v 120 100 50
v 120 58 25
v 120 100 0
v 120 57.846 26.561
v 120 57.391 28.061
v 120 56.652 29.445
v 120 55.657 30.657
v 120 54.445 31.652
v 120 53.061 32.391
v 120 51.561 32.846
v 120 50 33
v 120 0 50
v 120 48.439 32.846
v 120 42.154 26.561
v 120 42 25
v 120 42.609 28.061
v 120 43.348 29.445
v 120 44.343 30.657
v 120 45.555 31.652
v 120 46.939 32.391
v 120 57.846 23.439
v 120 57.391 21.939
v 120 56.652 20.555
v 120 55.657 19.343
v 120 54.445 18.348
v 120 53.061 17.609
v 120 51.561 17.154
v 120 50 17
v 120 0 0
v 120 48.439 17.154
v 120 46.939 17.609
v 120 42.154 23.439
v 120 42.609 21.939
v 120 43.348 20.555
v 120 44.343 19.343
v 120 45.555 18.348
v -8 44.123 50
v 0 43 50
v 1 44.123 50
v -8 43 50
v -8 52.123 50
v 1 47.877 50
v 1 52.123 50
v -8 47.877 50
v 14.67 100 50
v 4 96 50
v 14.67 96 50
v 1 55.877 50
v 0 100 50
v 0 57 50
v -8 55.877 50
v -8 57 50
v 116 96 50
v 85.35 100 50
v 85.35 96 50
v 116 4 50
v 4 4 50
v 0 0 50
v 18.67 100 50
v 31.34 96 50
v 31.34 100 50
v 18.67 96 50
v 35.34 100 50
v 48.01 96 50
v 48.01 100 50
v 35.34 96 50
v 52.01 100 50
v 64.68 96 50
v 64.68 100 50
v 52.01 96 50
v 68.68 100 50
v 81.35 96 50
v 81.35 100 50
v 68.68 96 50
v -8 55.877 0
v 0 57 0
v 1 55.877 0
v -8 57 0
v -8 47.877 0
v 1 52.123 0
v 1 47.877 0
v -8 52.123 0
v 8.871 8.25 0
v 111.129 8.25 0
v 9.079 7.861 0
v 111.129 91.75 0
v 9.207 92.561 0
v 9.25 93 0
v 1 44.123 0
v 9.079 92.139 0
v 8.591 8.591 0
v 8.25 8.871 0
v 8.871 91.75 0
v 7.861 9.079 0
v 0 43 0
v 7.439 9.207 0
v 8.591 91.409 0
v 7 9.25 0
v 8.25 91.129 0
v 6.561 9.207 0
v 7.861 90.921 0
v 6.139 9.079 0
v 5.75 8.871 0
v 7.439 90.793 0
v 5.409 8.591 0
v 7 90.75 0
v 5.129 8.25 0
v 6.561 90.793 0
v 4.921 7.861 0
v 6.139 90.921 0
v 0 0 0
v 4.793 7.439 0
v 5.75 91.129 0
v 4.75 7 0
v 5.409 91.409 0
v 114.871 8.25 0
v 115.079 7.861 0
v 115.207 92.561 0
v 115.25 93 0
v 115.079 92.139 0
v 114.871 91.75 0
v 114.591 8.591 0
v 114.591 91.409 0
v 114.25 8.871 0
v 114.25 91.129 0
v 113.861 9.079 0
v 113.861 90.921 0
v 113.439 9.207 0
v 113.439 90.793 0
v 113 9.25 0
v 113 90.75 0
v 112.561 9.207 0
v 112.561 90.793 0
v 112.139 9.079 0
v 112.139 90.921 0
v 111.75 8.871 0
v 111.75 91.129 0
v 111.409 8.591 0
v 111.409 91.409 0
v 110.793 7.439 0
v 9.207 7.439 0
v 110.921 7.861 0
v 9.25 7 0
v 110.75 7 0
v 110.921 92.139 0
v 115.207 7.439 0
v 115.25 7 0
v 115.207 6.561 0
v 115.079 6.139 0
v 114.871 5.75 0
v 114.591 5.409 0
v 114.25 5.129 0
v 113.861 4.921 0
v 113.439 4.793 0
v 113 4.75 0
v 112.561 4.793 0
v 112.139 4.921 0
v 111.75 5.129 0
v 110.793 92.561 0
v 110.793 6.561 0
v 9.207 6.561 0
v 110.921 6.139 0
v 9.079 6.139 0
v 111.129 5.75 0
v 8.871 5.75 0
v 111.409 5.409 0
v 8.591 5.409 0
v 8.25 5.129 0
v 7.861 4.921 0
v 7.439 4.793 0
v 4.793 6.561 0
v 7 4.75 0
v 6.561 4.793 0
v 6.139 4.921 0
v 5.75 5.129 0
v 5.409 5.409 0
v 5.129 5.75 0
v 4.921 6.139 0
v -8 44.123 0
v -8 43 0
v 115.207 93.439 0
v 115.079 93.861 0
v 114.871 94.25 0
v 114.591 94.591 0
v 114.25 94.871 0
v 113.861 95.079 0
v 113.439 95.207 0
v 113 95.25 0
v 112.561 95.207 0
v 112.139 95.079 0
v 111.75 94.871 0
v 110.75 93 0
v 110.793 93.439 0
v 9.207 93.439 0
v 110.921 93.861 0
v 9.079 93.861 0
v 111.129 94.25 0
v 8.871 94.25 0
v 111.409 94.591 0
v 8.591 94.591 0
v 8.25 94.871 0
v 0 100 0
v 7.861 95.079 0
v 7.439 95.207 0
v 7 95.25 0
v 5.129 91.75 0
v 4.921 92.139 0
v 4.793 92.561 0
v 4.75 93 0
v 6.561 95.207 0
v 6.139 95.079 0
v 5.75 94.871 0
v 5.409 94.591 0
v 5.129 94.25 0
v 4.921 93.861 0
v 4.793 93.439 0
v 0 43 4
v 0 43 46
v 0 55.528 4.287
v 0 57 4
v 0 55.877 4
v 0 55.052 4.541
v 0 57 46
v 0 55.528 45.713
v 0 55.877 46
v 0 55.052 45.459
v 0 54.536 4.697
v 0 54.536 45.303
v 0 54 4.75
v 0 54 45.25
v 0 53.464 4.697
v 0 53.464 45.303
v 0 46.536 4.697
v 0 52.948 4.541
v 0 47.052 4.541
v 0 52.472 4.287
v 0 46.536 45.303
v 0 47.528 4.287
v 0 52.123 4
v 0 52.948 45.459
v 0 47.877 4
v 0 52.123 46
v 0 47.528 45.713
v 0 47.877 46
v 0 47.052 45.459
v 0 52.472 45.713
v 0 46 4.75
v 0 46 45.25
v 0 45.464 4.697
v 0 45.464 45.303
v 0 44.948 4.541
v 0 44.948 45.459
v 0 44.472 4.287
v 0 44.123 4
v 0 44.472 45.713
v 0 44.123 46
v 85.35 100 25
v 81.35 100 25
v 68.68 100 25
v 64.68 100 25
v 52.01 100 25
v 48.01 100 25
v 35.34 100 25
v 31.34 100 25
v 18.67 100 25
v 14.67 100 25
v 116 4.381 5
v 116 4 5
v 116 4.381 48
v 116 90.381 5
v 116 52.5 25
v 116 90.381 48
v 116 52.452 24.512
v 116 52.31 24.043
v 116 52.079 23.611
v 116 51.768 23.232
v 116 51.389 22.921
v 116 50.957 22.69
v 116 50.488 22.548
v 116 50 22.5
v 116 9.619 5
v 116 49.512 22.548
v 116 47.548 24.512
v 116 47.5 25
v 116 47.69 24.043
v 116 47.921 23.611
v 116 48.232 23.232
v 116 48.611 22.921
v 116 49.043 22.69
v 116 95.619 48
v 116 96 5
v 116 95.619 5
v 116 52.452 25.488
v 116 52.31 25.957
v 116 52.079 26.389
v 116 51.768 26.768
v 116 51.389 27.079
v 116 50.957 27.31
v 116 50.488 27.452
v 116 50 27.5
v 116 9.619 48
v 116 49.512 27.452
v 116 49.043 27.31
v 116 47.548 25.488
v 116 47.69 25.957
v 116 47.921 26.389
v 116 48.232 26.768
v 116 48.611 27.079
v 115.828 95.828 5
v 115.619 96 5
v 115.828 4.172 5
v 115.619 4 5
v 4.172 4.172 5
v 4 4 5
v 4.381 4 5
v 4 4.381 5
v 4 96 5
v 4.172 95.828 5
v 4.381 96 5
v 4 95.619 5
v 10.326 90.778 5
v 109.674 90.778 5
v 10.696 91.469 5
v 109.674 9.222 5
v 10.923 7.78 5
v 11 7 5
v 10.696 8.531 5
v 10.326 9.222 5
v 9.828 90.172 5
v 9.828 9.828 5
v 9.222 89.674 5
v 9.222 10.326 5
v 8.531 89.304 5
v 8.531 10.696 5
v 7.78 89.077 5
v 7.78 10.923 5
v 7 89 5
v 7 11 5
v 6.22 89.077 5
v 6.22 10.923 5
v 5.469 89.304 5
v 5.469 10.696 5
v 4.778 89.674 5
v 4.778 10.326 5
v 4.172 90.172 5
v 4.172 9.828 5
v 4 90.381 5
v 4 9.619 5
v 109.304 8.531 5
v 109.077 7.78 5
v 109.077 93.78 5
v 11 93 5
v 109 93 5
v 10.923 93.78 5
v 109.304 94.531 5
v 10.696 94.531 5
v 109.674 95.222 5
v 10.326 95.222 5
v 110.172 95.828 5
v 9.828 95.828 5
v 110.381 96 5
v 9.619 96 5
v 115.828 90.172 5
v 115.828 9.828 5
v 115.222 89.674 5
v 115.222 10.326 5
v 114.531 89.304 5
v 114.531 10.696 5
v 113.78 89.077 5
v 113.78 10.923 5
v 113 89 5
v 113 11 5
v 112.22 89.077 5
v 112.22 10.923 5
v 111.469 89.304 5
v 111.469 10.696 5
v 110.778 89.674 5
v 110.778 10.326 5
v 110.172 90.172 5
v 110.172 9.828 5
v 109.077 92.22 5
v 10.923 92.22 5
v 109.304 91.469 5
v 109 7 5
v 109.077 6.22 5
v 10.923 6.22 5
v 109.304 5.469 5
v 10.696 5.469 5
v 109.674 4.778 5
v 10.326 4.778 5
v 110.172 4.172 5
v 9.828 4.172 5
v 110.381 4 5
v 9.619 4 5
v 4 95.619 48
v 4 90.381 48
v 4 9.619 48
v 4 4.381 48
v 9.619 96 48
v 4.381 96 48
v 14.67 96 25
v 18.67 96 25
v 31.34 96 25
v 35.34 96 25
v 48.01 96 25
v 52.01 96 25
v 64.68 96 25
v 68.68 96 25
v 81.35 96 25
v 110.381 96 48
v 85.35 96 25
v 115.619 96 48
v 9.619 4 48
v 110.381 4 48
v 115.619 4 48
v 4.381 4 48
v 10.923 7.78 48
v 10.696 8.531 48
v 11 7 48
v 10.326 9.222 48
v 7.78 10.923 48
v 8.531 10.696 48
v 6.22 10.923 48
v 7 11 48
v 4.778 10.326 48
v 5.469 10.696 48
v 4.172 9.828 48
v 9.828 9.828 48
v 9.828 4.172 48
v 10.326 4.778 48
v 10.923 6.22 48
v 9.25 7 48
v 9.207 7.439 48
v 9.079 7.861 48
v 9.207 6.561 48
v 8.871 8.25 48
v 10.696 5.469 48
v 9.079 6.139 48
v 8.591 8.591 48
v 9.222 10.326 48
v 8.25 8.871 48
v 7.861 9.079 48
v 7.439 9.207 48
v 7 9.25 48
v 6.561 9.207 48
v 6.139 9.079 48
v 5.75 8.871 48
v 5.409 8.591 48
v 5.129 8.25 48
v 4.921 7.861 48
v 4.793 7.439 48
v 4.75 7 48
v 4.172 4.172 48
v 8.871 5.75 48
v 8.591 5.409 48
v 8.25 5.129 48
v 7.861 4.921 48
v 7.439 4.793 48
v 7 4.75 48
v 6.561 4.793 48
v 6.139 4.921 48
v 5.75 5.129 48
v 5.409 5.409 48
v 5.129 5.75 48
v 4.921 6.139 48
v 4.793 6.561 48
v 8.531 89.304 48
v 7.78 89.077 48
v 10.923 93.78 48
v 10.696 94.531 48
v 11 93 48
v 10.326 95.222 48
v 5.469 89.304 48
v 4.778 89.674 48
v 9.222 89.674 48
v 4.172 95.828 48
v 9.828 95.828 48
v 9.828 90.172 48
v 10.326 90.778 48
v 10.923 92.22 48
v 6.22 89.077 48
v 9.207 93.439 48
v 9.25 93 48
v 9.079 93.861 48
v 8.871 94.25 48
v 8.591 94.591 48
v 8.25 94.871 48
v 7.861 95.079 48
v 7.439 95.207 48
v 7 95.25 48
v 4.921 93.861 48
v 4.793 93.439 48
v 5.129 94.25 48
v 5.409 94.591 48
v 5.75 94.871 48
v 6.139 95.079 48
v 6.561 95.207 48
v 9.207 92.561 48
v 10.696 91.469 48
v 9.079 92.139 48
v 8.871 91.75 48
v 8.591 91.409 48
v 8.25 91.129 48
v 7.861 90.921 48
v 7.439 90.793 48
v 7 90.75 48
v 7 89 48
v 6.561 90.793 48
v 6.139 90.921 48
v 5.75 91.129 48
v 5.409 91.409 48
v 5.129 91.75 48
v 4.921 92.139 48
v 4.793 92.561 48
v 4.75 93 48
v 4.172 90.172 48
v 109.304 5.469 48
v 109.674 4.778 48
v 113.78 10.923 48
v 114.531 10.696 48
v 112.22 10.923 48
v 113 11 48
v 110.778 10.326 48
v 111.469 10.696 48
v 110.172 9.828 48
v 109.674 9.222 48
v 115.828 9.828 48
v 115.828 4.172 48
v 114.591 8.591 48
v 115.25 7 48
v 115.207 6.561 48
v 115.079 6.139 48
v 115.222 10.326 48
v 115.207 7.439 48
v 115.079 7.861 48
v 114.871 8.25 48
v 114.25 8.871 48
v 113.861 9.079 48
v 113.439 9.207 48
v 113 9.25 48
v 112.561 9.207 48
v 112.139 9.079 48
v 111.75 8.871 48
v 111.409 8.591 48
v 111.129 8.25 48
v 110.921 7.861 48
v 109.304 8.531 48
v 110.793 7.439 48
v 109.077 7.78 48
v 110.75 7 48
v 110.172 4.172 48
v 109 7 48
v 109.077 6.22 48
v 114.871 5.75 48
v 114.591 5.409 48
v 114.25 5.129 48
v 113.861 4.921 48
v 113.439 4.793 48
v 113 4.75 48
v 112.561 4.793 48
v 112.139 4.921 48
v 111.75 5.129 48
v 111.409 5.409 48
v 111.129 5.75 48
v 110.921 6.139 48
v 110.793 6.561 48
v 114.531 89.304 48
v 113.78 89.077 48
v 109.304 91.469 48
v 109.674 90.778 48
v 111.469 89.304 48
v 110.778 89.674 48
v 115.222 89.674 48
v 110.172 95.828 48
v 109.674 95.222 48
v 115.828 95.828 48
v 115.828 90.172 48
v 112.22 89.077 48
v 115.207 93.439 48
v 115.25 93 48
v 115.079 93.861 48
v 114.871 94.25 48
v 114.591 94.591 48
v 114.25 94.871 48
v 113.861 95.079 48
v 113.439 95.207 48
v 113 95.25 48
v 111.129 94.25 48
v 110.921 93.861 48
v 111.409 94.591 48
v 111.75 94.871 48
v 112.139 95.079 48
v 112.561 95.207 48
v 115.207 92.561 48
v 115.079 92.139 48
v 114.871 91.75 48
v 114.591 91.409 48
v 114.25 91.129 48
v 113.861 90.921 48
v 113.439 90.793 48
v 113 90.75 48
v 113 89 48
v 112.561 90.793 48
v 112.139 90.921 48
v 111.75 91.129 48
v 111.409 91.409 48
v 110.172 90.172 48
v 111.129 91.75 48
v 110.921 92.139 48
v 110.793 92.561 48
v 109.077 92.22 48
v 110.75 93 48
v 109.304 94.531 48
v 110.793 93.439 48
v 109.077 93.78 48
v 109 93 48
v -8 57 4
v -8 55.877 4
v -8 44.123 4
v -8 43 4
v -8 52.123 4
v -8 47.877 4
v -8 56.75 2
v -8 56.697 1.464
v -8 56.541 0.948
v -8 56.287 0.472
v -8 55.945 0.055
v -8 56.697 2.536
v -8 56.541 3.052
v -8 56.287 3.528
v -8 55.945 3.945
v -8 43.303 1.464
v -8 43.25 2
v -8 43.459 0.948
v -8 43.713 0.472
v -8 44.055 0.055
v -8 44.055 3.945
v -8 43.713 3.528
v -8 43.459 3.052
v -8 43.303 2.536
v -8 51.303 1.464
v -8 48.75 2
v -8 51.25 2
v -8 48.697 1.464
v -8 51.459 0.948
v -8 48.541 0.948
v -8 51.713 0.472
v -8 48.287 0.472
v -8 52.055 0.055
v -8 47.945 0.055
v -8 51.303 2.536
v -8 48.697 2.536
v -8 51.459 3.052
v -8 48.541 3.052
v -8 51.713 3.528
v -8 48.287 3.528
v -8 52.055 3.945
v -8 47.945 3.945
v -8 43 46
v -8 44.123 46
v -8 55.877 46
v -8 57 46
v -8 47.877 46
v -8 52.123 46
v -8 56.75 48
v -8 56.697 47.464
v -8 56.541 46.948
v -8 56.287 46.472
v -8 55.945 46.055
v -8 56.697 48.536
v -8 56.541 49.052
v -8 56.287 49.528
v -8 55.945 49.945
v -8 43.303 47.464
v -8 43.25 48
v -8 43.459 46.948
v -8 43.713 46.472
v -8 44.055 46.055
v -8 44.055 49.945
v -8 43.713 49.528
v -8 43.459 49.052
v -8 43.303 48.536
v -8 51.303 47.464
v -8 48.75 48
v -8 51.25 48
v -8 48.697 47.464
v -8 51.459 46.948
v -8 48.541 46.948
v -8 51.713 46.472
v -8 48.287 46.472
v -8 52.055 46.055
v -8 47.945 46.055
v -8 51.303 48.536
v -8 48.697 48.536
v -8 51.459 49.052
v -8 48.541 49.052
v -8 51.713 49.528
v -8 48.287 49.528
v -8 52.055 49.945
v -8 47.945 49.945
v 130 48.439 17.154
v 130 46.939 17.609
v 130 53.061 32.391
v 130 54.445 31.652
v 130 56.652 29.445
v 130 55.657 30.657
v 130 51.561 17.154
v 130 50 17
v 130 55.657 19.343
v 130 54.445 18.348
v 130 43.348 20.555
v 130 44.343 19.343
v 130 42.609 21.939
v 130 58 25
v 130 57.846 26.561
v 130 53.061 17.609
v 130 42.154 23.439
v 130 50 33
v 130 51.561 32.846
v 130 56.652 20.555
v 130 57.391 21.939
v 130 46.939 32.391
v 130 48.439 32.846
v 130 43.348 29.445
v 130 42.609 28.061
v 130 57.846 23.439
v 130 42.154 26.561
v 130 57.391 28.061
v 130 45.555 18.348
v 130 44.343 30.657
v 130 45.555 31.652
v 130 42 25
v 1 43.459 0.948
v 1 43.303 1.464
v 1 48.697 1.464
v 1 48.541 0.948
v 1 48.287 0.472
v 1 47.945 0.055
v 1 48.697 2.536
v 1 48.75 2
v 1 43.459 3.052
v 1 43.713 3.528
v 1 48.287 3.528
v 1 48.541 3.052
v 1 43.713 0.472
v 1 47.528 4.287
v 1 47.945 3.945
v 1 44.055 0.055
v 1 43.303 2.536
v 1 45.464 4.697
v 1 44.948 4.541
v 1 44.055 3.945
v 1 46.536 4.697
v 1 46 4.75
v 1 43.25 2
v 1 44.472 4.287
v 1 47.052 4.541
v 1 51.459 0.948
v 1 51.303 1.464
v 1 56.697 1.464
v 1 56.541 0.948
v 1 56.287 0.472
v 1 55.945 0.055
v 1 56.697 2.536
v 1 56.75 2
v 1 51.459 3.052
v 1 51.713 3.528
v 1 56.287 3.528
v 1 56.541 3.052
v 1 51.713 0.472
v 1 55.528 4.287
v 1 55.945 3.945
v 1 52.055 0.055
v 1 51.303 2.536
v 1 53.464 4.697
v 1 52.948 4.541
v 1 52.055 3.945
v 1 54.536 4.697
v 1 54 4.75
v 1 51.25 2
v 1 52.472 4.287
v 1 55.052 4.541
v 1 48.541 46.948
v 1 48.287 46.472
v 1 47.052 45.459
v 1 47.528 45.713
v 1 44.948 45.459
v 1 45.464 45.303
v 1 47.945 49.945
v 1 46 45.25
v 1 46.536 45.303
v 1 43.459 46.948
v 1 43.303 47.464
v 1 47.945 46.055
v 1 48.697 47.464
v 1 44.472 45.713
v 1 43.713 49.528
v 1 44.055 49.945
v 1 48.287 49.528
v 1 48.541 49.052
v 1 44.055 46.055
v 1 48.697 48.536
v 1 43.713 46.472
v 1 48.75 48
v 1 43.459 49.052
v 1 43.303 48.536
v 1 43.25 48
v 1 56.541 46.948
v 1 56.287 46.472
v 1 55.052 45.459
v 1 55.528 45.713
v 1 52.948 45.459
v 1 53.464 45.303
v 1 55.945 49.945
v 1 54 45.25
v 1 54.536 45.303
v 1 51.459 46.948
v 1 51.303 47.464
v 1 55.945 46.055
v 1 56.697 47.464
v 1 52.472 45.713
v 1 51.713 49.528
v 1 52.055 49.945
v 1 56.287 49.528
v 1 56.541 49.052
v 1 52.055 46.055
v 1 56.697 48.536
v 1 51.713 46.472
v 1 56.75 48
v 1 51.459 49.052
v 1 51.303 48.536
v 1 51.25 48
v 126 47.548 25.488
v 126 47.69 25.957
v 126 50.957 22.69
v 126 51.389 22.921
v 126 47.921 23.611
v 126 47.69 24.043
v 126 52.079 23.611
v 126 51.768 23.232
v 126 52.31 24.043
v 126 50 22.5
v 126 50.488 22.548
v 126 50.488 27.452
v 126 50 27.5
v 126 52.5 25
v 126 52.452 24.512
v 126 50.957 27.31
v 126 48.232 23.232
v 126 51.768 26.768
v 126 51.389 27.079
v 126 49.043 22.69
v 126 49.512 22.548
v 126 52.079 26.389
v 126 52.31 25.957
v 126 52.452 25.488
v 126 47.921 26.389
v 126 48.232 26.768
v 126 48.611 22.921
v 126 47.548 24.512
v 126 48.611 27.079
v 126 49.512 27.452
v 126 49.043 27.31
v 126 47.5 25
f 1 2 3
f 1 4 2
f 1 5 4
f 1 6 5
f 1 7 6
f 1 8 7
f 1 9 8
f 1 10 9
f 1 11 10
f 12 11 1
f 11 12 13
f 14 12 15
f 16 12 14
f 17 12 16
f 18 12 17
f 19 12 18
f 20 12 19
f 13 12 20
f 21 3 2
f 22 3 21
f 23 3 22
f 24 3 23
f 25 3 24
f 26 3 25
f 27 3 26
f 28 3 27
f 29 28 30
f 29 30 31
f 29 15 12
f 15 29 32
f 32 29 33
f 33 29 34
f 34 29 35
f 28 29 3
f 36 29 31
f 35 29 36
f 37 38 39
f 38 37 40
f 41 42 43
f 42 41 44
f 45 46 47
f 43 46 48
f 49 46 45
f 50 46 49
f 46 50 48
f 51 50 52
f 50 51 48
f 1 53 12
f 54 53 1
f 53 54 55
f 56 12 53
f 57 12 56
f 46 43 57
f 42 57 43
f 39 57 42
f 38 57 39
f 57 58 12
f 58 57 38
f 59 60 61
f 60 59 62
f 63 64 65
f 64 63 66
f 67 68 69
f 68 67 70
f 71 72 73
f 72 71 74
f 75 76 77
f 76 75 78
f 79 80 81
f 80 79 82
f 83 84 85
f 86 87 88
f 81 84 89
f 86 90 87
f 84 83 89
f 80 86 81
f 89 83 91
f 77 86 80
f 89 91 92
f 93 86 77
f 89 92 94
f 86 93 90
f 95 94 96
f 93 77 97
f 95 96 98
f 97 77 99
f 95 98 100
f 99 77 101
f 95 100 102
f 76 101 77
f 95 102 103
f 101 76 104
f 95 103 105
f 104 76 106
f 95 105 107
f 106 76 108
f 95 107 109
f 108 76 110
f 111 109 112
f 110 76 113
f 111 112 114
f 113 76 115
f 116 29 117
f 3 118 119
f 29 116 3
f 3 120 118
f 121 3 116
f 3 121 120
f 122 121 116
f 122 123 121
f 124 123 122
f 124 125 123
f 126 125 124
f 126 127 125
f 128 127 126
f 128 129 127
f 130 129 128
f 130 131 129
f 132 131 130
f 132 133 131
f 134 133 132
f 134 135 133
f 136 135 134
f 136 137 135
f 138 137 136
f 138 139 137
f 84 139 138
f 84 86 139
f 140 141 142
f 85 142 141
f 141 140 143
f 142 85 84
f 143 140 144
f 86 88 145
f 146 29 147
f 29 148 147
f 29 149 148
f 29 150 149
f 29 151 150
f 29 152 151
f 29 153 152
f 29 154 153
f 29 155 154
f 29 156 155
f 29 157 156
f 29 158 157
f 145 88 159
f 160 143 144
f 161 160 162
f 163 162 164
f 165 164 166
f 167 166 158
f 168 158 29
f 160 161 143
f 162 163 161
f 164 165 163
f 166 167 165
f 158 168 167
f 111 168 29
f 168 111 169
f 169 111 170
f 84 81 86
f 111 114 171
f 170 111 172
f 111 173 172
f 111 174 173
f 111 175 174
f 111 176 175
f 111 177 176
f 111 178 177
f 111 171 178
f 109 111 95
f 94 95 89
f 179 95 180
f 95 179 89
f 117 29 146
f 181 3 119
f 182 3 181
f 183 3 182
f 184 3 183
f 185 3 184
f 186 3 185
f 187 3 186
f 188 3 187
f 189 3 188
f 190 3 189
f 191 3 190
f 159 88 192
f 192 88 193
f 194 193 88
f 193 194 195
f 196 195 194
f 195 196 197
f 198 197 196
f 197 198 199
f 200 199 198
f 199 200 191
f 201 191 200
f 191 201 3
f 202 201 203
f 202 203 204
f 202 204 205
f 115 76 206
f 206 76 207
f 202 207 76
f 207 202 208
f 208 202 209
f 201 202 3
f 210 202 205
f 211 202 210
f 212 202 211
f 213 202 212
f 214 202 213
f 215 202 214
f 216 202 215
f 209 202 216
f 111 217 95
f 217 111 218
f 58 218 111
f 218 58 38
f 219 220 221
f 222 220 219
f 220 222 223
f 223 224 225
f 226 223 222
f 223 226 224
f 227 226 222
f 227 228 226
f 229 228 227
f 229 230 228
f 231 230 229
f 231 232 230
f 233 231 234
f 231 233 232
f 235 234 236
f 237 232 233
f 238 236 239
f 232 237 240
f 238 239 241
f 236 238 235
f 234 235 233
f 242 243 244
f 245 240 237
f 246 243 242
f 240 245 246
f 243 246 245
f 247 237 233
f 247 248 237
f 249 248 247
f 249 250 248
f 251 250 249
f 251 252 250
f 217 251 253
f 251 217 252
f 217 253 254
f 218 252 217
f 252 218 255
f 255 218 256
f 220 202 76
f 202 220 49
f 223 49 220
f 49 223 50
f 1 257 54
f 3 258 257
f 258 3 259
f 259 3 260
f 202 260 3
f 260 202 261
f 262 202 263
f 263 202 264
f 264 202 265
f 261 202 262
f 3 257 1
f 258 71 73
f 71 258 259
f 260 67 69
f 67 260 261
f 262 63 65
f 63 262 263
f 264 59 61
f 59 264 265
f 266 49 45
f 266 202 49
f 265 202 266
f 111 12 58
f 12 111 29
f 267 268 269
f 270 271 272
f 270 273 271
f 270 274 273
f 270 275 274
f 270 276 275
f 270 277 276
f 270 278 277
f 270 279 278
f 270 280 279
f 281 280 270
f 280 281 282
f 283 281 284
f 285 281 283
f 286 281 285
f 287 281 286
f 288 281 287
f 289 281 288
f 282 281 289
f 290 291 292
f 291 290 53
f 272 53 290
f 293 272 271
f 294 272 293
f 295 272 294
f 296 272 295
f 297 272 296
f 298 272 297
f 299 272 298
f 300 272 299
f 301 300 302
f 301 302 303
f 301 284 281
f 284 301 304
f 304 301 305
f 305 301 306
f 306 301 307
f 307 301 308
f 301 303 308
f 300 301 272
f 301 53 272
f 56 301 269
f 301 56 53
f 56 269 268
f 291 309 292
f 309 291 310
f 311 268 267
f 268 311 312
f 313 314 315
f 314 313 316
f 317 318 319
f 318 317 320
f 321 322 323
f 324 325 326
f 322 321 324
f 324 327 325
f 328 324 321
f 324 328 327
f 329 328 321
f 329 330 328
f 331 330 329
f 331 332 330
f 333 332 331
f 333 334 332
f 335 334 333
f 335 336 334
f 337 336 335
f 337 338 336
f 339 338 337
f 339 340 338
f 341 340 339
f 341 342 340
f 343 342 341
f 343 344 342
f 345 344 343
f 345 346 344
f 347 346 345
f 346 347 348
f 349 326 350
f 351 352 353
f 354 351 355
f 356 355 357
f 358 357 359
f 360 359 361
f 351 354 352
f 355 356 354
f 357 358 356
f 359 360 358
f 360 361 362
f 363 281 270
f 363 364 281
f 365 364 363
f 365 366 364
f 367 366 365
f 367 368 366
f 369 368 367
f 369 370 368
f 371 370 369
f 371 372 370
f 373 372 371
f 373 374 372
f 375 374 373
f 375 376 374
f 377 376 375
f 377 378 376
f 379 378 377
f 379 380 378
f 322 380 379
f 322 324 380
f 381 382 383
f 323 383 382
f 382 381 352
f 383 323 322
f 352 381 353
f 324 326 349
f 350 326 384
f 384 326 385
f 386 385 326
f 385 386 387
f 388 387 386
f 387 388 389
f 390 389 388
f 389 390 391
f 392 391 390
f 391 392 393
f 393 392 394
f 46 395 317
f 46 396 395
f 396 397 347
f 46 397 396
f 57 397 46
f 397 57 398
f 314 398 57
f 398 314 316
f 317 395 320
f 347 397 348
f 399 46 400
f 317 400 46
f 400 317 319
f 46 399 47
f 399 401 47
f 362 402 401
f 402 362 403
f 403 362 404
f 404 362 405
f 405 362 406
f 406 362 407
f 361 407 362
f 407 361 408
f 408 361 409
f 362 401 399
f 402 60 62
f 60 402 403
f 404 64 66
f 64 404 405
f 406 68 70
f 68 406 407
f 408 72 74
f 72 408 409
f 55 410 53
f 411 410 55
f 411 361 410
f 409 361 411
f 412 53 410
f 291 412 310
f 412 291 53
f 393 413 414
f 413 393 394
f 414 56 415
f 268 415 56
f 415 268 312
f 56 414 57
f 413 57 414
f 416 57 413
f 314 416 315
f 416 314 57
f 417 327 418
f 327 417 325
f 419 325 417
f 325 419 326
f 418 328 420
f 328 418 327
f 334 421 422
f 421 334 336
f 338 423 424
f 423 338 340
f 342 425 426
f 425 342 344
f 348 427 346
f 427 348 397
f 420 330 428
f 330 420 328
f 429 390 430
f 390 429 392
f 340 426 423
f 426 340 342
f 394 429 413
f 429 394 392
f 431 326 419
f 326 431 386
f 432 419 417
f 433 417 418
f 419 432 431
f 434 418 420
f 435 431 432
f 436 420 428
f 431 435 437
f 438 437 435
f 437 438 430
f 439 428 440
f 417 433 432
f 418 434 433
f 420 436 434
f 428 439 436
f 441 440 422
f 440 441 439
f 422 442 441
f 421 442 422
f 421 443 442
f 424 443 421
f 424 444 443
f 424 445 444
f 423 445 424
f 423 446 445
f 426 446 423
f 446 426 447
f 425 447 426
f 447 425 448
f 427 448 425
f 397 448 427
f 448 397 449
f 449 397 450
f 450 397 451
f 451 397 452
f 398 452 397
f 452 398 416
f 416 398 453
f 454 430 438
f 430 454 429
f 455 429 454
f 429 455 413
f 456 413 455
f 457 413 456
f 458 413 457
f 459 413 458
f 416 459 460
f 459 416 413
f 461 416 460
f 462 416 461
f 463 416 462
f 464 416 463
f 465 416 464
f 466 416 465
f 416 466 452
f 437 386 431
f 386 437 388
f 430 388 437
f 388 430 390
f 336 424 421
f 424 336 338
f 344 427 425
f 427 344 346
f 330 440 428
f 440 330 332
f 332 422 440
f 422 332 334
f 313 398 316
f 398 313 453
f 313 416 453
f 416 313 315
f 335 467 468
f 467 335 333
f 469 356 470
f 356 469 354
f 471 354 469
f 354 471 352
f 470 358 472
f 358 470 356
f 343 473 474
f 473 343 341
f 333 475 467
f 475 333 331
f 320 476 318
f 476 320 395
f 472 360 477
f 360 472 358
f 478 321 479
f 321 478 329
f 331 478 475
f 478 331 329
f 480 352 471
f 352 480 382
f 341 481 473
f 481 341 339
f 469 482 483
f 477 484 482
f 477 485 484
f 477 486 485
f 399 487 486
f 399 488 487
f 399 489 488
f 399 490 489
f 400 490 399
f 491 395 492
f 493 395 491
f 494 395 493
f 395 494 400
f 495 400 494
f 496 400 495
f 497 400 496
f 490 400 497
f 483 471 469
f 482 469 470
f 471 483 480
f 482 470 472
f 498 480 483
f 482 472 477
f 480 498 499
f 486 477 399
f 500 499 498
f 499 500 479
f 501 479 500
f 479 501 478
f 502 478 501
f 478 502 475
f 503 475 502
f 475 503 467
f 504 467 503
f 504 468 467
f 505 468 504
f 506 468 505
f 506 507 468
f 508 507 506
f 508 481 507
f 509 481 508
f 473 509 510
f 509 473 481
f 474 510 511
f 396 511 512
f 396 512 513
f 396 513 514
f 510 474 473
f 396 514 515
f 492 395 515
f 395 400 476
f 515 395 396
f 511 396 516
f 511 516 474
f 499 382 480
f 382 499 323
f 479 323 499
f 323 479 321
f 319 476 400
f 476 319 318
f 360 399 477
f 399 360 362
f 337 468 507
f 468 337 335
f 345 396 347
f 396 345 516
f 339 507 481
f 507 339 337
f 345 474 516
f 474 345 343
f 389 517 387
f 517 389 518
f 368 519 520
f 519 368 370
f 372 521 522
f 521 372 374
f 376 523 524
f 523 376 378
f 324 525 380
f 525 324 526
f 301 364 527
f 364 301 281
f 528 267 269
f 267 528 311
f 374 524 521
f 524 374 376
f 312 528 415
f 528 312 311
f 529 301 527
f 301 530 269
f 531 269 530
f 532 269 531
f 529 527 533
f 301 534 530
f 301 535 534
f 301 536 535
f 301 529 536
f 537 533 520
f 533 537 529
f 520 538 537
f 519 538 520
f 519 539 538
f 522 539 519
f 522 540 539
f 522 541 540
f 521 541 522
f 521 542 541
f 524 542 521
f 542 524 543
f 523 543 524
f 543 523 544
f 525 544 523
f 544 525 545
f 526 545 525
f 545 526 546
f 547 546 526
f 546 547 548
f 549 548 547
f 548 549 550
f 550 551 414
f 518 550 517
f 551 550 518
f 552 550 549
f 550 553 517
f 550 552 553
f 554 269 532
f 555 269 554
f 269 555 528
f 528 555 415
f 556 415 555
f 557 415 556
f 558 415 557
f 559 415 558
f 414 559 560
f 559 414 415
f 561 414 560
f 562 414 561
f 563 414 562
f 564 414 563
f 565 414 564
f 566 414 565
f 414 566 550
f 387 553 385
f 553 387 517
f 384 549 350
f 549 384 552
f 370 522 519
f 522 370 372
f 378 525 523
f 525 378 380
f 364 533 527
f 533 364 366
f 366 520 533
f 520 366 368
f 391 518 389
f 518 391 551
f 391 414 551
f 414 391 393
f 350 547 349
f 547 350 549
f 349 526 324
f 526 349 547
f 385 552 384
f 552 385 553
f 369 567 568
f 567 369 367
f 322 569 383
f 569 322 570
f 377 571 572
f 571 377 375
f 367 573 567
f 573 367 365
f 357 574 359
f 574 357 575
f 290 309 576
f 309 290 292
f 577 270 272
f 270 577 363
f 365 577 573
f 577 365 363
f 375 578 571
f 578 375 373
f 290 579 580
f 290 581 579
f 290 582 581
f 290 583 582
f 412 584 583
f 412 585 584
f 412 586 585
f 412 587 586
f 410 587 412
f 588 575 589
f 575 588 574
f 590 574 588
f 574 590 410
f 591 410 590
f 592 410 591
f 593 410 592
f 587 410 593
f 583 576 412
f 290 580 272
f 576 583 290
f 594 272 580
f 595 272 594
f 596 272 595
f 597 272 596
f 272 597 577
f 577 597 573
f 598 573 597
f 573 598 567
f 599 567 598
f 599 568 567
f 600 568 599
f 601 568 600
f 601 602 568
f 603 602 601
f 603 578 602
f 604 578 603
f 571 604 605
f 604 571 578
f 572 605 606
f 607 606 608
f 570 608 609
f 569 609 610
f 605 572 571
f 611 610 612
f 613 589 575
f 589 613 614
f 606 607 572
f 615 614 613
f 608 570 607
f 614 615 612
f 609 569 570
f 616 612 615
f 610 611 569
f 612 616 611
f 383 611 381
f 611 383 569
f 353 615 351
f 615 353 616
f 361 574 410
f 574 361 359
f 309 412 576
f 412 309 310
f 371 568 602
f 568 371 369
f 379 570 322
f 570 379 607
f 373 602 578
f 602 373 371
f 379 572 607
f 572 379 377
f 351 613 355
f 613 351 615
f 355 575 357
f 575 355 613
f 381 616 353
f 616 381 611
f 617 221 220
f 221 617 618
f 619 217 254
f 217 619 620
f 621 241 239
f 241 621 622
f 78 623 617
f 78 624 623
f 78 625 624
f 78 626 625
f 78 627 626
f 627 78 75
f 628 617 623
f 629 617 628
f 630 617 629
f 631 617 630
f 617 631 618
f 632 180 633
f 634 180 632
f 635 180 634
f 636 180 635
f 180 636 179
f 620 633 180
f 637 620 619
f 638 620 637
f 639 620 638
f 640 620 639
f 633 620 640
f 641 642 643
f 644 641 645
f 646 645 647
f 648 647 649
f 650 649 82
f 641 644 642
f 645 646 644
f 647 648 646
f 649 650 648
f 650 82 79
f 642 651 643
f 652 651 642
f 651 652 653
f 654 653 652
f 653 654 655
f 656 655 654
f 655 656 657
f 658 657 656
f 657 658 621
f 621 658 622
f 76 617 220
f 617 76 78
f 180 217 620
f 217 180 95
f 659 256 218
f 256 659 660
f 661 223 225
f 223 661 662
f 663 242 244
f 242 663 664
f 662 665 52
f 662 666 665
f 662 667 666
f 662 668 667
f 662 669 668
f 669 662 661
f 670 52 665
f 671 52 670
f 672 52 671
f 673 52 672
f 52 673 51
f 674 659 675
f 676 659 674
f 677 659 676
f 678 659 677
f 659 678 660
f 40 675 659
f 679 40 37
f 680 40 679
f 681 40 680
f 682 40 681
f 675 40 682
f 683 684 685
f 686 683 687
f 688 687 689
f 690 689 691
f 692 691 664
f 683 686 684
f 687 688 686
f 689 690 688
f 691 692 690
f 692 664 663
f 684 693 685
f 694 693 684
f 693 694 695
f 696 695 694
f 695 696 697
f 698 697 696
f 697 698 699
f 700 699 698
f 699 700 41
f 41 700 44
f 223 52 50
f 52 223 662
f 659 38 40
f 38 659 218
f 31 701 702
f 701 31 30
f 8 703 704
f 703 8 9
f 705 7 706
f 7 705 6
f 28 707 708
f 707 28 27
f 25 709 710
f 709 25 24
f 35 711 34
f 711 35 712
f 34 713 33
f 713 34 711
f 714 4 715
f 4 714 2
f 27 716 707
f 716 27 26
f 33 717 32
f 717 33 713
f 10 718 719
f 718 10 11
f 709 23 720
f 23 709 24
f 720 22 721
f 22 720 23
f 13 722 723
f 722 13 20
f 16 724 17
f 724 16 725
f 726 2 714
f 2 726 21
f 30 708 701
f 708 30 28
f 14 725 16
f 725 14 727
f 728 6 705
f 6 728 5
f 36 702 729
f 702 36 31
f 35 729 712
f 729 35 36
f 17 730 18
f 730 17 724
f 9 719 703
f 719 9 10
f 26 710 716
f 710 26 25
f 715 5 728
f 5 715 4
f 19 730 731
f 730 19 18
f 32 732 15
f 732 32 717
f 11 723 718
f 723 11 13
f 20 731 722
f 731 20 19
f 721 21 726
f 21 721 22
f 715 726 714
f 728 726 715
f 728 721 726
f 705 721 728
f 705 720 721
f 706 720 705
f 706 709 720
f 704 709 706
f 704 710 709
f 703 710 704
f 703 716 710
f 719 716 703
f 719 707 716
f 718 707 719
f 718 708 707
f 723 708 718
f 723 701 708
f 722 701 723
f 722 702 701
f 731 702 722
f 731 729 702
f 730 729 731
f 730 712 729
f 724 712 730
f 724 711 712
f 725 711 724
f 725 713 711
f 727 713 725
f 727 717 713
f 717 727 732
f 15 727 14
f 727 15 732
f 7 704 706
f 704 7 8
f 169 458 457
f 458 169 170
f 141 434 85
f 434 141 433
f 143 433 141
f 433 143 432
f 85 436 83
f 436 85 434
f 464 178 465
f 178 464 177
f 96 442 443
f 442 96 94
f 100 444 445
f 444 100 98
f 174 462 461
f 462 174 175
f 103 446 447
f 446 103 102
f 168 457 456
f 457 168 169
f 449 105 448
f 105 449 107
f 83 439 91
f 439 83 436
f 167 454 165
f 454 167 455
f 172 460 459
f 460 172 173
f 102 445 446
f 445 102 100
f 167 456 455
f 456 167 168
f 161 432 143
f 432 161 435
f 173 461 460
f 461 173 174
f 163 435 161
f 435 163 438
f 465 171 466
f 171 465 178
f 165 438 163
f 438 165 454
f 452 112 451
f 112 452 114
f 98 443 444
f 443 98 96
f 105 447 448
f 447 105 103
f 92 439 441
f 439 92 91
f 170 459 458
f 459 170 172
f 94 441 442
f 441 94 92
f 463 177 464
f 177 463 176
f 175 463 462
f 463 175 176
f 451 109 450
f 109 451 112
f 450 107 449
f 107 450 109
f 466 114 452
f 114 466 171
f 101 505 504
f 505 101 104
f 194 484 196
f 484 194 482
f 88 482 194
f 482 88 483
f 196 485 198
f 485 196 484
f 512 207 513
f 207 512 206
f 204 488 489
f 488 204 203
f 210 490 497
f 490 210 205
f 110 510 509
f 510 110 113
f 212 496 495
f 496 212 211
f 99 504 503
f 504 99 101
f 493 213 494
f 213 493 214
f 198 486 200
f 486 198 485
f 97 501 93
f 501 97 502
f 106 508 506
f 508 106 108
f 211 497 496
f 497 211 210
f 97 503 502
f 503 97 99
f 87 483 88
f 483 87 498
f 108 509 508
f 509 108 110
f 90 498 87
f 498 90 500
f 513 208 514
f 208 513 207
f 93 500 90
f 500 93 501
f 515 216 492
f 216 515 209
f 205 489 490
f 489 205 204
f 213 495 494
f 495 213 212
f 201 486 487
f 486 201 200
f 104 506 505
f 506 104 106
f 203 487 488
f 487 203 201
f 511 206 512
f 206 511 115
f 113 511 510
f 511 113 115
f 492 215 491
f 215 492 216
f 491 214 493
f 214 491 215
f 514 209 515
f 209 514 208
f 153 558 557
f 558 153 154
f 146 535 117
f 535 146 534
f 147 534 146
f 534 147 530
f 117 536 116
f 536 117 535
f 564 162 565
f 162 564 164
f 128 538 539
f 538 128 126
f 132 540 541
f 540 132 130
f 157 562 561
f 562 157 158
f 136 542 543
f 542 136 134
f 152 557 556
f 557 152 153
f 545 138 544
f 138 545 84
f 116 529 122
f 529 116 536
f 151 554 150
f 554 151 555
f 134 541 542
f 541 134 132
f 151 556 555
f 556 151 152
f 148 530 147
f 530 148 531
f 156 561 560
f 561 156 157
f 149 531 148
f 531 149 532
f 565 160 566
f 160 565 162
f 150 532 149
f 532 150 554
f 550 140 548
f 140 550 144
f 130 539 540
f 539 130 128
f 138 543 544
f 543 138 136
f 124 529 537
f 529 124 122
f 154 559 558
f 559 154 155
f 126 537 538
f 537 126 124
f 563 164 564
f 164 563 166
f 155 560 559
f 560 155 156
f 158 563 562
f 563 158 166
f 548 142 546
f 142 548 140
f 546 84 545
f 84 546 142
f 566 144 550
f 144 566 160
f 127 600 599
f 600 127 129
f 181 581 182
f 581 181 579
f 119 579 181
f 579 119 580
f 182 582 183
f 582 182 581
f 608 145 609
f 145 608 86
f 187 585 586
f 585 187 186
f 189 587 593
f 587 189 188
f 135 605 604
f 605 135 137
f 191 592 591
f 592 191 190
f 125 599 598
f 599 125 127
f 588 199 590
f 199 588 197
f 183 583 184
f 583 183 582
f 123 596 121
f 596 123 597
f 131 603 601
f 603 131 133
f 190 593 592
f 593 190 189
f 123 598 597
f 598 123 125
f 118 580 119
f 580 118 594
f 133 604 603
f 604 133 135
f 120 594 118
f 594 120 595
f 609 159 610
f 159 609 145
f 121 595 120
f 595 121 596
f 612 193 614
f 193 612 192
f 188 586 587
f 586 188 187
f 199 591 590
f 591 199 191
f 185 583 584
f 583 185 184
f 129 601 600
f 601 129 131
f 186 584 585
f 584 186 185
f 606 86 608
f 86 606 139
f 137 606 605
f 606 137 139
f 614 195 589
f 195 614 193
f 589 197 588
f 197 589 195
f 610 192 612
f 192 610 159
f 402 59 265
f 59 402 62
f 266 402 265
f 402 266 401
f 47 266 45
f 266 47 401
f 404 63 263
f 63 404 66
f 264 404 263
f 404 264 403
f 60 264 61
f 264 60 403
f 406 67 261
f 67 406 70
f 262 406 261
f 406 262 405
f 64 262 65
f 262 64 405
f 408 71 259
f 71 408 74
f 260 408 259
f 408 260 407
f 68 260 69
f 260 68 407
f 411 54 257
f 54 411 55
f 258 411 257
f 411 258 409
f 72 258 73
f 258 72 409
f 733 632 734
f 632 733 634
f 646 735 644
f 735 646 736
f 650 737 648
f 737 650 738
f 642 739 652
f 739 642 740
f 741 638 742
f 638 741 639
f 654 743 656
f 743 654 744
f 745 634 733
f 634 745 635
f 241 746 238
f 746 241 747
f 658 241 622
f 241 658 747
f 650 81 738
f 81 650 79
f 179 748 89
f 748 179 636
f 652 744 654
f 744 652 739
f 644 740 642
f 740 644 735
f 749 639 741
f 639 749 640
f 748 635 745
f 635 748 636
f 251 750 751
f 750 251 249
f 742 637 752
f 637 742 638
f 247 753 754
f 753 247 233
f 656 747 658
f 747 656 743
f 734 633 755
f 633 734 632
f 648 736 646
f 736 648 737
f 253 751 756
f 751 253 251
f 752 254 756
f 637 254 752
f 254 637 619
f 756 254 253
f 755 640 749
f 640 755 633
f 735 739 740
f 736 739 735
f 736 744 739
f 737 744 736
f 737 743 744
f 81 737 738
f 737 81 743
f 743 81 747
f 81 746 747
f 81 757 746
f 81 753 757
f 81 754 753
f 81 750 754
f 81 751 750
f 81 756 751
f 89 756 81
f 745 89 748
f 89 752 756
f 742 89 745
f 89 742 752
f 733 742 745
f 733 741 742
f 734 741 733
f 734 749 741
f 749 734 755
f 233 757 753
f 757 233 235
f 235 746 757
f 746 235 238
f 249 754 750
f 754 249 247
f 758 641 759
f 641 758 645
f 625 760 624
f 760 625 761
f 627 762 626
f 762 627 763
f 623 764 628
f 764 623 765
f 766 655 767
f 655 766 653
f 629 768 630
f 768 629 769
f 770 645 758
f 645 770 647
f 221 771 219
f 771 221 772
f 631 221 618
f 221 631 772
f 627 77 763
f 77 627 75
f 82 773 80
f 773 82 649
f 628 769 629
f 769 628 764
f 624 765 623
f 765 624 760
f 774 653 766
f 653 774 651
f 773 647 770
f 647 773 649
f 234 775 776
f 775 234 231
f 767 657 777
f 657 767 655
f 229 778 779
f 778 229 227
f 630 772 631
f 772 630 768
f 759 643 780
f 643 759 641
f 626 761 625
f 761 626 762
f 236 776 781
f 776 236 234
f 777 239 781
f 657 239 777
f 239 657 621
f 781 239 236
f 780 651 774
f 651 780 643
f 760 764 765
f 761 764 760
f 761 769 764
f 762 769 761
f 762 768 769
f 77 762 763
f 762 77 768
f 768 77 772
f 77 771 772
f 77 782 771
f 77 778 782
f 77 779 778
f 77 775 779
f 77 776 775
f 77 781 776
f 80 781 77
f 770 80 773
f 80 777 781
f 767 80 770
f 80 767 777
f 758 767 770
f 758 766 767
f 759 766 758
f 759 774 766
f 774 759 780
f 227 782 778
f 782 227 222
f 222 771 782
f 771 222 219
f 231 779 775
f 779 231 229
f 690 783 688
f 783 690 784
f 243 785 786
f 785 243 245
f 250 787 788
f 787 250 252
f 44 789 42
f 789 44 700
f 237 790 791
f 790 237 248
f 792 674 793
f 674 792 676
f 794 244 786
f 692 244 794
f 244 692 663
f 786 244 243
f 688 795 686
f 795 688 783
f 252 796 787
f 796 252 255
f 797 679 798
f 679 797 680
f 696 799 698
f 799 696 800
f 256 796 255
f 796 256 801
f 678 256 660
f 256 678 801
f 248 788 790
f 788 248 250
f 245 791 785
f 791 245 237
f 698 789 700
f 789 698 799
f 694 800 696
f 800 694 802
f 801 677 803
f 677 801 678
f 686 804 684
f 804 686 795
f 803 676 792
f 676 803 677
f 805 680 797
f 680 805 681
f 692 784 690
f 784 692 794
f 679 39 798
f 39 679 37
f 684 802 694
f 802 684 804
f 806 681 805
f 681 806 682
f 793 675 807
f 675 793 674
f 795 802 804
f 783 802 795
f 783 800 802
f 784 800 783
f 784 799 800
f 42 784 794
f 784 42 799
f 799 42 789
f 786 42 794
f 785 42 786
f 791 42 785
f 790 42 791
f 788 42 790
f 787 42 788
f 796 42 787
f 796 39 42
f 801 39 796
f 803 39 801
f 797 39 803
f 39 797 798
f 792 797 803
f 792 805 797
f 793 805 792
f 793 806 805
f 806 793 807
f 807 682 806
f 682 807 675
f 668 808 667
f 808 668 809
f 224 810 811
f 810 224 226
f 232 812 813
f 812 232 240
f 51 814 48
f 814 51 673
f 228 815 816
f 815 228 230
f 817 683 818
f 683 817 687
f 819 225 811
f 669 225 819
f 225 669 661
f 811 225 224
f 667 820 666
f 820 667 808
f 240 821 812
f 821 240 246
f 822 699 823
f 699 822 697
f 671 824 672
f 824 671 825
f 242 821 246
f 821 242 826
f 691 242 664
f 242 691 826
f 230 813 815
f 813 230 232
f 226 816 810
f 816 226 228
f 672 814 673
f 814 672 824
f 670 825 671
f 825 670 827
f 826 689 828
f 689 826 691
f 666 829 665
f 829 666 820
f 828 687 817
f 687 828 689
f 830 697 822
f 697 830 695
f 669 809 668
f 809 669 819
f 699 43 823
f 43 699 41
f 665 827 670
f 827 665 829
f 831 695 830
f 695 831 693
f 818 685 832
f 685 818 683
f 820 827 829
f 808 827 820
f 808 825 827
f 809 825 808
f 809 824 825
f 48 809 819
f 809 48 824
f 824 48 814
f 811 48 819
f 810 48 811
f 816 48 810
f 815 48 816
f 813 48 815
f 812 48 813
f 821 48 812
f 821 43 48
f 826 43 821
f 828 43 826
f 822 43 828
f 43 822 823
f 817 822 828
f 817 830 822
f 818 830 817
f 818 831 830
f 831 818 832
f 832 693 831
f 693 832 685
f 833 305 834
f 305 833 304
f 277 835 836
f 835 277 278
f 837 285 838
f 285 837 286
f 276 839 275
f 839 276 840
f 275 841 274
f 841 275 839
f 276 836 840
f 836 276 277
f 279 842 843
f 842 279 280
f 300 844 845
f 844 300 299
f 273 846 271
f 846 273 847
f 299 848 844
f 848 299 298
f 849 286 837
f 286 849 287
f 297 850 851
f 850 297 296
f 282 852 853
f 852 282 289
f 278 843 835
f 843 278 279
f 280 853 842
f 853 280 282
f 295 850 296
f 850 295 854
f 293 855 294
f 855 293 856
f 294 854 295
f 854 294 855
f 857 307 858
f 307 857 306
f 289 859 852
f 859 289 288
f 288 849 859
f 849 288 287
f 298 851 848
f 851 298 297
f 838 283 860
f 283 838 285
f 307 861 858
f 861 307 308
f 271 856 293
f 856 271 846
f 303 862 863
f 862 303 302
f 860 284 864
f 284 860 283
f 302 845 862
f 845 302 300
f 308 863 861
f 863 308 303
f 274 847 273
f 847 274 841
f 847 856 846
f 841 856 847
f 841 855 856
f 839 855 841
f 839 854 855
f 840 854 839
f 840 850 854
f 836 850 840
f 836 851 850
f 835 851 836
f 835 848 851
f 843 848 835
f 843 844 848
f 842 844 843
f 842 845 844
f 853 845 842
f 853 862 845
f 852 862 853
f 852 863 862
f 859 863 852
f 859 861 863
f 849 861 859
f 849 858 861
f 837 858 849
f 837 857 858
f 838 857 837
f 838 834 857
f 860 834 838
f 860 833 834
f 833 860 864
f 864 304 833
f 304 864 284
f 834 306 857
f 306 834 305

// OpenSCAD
$fn = 32;

// ----------------------------------------------------------------------
// Enclosure body: 120 x 100 x 50 mm, wall 4 mm
// ----------------------------------------------------------------------

// --- parameters (mm) ---
length = 120;             // outside length, X
width = 100;              // outside width, Y
height = 50;              // outside height, Z
wall = 4;                 // side wall thickness
floor_t = 5;              // floor thickness
boss_d = 8;               // corner boss diameter
boss_h = 43;              // corner boss height above the floor
boss_hole_d = 4.5;        // lid screw clearance in the boss
boss_lip = 7;             // boss centre inset from the corner
ear_w = 14;               // mounting ear width
ear_t = 4;                // mounting ear thickness
ear_ext = 8;              // mounting ear reach
ear_hole_d = 5.5;         // mounting ear drills
vent_slots = 5;           // vent slots in the long wall
vent_w = 4;               // vent slot width
vent_h = 25;              // vent slot height
vent_pitch = 16.67;       // vent slot pitch
vent_z = 25;              // vent slot sill height
nipple_d = 16;            // cable gland boss diameter
nipple_h = 10;            // cable gland boss height
nipple_bore = 5;          // cable gland bore

module shell() {
  difference() {
    cube([length, width, height]);
    /* hollow, open at the top */
    translate([wall, wall, floor_t])
      cube([length - 2 * wall, width - 2 * wall, height]);
  }
}

module bosses() {
  /* corner bosses, sunk 1 mm into the floor */
  for (sx = [0, 1]) for (sy = [0, 1])
    translate([sx * (length - 2 * boss_lip) + boss_lip, sy * (width - 2 * boss_lip) + boss_lip, floor_t - 1])
      cylinder(h = boss_h + 1, d = boss_d);
}

module gland() {
  /* boss on the short wall, sunk 1 mm into it */
  translate([length - 1, width / 2, height * 0.5]) rotate([0, 90, 0])
    cylinder(h = nipple_h + 1, d = nipple_d);
}

module ears() {
  /* mounting ears on the short walls, sunk into the wall */
  for (sz = [0, 1])
    translate([-ear_ext, width / 2 - ear_w / 2, sz * (height - ear_t)])
      cube([ear_ext + 2.5, ear_w, ear_t]);
}

difference() {
  union() {
    shell();
    bosses();
    gland();
    ears();
  }
  /* boss screw holes */
  for (sx = [0, 1]) for (sy = [0, 1])
    translate([sx * (length - 2 * boss_lip) + boss_lip, sy * (width - 2 * boss_lip) + boss_lip, -1]) cylinder(h = floor_t + boss_h + 2, d = boss_hole_d);
  /* vent grille in the +Y wall */
  for (i = [0 : vent_slots - 1]) translate([vent_pitch * (i + 1) - vent_w / 2, width - wall - 1, vent_z]) cube([vent_w, wall + 2, vent_h]);
  translate([length, width / 2, height * 0.5]) rotate([0, 90, 0]) translate([0, 0, -nipple_h - 2]) cylinder(h = nipple_h + wall + 4, d = nipple_bore);
  for (sz = [0, 1]) for (sx = [0, 1]) translate([-ear_ext - 1, width / 2 + (2 * sx - 1) * (ear_w / 2 - 3), sz * (height - ear_t) + ear_t / 2]) rotate([0, 90, 0]) cylinder(h = ear_ext + 2, d = ear_hole_d);
}
